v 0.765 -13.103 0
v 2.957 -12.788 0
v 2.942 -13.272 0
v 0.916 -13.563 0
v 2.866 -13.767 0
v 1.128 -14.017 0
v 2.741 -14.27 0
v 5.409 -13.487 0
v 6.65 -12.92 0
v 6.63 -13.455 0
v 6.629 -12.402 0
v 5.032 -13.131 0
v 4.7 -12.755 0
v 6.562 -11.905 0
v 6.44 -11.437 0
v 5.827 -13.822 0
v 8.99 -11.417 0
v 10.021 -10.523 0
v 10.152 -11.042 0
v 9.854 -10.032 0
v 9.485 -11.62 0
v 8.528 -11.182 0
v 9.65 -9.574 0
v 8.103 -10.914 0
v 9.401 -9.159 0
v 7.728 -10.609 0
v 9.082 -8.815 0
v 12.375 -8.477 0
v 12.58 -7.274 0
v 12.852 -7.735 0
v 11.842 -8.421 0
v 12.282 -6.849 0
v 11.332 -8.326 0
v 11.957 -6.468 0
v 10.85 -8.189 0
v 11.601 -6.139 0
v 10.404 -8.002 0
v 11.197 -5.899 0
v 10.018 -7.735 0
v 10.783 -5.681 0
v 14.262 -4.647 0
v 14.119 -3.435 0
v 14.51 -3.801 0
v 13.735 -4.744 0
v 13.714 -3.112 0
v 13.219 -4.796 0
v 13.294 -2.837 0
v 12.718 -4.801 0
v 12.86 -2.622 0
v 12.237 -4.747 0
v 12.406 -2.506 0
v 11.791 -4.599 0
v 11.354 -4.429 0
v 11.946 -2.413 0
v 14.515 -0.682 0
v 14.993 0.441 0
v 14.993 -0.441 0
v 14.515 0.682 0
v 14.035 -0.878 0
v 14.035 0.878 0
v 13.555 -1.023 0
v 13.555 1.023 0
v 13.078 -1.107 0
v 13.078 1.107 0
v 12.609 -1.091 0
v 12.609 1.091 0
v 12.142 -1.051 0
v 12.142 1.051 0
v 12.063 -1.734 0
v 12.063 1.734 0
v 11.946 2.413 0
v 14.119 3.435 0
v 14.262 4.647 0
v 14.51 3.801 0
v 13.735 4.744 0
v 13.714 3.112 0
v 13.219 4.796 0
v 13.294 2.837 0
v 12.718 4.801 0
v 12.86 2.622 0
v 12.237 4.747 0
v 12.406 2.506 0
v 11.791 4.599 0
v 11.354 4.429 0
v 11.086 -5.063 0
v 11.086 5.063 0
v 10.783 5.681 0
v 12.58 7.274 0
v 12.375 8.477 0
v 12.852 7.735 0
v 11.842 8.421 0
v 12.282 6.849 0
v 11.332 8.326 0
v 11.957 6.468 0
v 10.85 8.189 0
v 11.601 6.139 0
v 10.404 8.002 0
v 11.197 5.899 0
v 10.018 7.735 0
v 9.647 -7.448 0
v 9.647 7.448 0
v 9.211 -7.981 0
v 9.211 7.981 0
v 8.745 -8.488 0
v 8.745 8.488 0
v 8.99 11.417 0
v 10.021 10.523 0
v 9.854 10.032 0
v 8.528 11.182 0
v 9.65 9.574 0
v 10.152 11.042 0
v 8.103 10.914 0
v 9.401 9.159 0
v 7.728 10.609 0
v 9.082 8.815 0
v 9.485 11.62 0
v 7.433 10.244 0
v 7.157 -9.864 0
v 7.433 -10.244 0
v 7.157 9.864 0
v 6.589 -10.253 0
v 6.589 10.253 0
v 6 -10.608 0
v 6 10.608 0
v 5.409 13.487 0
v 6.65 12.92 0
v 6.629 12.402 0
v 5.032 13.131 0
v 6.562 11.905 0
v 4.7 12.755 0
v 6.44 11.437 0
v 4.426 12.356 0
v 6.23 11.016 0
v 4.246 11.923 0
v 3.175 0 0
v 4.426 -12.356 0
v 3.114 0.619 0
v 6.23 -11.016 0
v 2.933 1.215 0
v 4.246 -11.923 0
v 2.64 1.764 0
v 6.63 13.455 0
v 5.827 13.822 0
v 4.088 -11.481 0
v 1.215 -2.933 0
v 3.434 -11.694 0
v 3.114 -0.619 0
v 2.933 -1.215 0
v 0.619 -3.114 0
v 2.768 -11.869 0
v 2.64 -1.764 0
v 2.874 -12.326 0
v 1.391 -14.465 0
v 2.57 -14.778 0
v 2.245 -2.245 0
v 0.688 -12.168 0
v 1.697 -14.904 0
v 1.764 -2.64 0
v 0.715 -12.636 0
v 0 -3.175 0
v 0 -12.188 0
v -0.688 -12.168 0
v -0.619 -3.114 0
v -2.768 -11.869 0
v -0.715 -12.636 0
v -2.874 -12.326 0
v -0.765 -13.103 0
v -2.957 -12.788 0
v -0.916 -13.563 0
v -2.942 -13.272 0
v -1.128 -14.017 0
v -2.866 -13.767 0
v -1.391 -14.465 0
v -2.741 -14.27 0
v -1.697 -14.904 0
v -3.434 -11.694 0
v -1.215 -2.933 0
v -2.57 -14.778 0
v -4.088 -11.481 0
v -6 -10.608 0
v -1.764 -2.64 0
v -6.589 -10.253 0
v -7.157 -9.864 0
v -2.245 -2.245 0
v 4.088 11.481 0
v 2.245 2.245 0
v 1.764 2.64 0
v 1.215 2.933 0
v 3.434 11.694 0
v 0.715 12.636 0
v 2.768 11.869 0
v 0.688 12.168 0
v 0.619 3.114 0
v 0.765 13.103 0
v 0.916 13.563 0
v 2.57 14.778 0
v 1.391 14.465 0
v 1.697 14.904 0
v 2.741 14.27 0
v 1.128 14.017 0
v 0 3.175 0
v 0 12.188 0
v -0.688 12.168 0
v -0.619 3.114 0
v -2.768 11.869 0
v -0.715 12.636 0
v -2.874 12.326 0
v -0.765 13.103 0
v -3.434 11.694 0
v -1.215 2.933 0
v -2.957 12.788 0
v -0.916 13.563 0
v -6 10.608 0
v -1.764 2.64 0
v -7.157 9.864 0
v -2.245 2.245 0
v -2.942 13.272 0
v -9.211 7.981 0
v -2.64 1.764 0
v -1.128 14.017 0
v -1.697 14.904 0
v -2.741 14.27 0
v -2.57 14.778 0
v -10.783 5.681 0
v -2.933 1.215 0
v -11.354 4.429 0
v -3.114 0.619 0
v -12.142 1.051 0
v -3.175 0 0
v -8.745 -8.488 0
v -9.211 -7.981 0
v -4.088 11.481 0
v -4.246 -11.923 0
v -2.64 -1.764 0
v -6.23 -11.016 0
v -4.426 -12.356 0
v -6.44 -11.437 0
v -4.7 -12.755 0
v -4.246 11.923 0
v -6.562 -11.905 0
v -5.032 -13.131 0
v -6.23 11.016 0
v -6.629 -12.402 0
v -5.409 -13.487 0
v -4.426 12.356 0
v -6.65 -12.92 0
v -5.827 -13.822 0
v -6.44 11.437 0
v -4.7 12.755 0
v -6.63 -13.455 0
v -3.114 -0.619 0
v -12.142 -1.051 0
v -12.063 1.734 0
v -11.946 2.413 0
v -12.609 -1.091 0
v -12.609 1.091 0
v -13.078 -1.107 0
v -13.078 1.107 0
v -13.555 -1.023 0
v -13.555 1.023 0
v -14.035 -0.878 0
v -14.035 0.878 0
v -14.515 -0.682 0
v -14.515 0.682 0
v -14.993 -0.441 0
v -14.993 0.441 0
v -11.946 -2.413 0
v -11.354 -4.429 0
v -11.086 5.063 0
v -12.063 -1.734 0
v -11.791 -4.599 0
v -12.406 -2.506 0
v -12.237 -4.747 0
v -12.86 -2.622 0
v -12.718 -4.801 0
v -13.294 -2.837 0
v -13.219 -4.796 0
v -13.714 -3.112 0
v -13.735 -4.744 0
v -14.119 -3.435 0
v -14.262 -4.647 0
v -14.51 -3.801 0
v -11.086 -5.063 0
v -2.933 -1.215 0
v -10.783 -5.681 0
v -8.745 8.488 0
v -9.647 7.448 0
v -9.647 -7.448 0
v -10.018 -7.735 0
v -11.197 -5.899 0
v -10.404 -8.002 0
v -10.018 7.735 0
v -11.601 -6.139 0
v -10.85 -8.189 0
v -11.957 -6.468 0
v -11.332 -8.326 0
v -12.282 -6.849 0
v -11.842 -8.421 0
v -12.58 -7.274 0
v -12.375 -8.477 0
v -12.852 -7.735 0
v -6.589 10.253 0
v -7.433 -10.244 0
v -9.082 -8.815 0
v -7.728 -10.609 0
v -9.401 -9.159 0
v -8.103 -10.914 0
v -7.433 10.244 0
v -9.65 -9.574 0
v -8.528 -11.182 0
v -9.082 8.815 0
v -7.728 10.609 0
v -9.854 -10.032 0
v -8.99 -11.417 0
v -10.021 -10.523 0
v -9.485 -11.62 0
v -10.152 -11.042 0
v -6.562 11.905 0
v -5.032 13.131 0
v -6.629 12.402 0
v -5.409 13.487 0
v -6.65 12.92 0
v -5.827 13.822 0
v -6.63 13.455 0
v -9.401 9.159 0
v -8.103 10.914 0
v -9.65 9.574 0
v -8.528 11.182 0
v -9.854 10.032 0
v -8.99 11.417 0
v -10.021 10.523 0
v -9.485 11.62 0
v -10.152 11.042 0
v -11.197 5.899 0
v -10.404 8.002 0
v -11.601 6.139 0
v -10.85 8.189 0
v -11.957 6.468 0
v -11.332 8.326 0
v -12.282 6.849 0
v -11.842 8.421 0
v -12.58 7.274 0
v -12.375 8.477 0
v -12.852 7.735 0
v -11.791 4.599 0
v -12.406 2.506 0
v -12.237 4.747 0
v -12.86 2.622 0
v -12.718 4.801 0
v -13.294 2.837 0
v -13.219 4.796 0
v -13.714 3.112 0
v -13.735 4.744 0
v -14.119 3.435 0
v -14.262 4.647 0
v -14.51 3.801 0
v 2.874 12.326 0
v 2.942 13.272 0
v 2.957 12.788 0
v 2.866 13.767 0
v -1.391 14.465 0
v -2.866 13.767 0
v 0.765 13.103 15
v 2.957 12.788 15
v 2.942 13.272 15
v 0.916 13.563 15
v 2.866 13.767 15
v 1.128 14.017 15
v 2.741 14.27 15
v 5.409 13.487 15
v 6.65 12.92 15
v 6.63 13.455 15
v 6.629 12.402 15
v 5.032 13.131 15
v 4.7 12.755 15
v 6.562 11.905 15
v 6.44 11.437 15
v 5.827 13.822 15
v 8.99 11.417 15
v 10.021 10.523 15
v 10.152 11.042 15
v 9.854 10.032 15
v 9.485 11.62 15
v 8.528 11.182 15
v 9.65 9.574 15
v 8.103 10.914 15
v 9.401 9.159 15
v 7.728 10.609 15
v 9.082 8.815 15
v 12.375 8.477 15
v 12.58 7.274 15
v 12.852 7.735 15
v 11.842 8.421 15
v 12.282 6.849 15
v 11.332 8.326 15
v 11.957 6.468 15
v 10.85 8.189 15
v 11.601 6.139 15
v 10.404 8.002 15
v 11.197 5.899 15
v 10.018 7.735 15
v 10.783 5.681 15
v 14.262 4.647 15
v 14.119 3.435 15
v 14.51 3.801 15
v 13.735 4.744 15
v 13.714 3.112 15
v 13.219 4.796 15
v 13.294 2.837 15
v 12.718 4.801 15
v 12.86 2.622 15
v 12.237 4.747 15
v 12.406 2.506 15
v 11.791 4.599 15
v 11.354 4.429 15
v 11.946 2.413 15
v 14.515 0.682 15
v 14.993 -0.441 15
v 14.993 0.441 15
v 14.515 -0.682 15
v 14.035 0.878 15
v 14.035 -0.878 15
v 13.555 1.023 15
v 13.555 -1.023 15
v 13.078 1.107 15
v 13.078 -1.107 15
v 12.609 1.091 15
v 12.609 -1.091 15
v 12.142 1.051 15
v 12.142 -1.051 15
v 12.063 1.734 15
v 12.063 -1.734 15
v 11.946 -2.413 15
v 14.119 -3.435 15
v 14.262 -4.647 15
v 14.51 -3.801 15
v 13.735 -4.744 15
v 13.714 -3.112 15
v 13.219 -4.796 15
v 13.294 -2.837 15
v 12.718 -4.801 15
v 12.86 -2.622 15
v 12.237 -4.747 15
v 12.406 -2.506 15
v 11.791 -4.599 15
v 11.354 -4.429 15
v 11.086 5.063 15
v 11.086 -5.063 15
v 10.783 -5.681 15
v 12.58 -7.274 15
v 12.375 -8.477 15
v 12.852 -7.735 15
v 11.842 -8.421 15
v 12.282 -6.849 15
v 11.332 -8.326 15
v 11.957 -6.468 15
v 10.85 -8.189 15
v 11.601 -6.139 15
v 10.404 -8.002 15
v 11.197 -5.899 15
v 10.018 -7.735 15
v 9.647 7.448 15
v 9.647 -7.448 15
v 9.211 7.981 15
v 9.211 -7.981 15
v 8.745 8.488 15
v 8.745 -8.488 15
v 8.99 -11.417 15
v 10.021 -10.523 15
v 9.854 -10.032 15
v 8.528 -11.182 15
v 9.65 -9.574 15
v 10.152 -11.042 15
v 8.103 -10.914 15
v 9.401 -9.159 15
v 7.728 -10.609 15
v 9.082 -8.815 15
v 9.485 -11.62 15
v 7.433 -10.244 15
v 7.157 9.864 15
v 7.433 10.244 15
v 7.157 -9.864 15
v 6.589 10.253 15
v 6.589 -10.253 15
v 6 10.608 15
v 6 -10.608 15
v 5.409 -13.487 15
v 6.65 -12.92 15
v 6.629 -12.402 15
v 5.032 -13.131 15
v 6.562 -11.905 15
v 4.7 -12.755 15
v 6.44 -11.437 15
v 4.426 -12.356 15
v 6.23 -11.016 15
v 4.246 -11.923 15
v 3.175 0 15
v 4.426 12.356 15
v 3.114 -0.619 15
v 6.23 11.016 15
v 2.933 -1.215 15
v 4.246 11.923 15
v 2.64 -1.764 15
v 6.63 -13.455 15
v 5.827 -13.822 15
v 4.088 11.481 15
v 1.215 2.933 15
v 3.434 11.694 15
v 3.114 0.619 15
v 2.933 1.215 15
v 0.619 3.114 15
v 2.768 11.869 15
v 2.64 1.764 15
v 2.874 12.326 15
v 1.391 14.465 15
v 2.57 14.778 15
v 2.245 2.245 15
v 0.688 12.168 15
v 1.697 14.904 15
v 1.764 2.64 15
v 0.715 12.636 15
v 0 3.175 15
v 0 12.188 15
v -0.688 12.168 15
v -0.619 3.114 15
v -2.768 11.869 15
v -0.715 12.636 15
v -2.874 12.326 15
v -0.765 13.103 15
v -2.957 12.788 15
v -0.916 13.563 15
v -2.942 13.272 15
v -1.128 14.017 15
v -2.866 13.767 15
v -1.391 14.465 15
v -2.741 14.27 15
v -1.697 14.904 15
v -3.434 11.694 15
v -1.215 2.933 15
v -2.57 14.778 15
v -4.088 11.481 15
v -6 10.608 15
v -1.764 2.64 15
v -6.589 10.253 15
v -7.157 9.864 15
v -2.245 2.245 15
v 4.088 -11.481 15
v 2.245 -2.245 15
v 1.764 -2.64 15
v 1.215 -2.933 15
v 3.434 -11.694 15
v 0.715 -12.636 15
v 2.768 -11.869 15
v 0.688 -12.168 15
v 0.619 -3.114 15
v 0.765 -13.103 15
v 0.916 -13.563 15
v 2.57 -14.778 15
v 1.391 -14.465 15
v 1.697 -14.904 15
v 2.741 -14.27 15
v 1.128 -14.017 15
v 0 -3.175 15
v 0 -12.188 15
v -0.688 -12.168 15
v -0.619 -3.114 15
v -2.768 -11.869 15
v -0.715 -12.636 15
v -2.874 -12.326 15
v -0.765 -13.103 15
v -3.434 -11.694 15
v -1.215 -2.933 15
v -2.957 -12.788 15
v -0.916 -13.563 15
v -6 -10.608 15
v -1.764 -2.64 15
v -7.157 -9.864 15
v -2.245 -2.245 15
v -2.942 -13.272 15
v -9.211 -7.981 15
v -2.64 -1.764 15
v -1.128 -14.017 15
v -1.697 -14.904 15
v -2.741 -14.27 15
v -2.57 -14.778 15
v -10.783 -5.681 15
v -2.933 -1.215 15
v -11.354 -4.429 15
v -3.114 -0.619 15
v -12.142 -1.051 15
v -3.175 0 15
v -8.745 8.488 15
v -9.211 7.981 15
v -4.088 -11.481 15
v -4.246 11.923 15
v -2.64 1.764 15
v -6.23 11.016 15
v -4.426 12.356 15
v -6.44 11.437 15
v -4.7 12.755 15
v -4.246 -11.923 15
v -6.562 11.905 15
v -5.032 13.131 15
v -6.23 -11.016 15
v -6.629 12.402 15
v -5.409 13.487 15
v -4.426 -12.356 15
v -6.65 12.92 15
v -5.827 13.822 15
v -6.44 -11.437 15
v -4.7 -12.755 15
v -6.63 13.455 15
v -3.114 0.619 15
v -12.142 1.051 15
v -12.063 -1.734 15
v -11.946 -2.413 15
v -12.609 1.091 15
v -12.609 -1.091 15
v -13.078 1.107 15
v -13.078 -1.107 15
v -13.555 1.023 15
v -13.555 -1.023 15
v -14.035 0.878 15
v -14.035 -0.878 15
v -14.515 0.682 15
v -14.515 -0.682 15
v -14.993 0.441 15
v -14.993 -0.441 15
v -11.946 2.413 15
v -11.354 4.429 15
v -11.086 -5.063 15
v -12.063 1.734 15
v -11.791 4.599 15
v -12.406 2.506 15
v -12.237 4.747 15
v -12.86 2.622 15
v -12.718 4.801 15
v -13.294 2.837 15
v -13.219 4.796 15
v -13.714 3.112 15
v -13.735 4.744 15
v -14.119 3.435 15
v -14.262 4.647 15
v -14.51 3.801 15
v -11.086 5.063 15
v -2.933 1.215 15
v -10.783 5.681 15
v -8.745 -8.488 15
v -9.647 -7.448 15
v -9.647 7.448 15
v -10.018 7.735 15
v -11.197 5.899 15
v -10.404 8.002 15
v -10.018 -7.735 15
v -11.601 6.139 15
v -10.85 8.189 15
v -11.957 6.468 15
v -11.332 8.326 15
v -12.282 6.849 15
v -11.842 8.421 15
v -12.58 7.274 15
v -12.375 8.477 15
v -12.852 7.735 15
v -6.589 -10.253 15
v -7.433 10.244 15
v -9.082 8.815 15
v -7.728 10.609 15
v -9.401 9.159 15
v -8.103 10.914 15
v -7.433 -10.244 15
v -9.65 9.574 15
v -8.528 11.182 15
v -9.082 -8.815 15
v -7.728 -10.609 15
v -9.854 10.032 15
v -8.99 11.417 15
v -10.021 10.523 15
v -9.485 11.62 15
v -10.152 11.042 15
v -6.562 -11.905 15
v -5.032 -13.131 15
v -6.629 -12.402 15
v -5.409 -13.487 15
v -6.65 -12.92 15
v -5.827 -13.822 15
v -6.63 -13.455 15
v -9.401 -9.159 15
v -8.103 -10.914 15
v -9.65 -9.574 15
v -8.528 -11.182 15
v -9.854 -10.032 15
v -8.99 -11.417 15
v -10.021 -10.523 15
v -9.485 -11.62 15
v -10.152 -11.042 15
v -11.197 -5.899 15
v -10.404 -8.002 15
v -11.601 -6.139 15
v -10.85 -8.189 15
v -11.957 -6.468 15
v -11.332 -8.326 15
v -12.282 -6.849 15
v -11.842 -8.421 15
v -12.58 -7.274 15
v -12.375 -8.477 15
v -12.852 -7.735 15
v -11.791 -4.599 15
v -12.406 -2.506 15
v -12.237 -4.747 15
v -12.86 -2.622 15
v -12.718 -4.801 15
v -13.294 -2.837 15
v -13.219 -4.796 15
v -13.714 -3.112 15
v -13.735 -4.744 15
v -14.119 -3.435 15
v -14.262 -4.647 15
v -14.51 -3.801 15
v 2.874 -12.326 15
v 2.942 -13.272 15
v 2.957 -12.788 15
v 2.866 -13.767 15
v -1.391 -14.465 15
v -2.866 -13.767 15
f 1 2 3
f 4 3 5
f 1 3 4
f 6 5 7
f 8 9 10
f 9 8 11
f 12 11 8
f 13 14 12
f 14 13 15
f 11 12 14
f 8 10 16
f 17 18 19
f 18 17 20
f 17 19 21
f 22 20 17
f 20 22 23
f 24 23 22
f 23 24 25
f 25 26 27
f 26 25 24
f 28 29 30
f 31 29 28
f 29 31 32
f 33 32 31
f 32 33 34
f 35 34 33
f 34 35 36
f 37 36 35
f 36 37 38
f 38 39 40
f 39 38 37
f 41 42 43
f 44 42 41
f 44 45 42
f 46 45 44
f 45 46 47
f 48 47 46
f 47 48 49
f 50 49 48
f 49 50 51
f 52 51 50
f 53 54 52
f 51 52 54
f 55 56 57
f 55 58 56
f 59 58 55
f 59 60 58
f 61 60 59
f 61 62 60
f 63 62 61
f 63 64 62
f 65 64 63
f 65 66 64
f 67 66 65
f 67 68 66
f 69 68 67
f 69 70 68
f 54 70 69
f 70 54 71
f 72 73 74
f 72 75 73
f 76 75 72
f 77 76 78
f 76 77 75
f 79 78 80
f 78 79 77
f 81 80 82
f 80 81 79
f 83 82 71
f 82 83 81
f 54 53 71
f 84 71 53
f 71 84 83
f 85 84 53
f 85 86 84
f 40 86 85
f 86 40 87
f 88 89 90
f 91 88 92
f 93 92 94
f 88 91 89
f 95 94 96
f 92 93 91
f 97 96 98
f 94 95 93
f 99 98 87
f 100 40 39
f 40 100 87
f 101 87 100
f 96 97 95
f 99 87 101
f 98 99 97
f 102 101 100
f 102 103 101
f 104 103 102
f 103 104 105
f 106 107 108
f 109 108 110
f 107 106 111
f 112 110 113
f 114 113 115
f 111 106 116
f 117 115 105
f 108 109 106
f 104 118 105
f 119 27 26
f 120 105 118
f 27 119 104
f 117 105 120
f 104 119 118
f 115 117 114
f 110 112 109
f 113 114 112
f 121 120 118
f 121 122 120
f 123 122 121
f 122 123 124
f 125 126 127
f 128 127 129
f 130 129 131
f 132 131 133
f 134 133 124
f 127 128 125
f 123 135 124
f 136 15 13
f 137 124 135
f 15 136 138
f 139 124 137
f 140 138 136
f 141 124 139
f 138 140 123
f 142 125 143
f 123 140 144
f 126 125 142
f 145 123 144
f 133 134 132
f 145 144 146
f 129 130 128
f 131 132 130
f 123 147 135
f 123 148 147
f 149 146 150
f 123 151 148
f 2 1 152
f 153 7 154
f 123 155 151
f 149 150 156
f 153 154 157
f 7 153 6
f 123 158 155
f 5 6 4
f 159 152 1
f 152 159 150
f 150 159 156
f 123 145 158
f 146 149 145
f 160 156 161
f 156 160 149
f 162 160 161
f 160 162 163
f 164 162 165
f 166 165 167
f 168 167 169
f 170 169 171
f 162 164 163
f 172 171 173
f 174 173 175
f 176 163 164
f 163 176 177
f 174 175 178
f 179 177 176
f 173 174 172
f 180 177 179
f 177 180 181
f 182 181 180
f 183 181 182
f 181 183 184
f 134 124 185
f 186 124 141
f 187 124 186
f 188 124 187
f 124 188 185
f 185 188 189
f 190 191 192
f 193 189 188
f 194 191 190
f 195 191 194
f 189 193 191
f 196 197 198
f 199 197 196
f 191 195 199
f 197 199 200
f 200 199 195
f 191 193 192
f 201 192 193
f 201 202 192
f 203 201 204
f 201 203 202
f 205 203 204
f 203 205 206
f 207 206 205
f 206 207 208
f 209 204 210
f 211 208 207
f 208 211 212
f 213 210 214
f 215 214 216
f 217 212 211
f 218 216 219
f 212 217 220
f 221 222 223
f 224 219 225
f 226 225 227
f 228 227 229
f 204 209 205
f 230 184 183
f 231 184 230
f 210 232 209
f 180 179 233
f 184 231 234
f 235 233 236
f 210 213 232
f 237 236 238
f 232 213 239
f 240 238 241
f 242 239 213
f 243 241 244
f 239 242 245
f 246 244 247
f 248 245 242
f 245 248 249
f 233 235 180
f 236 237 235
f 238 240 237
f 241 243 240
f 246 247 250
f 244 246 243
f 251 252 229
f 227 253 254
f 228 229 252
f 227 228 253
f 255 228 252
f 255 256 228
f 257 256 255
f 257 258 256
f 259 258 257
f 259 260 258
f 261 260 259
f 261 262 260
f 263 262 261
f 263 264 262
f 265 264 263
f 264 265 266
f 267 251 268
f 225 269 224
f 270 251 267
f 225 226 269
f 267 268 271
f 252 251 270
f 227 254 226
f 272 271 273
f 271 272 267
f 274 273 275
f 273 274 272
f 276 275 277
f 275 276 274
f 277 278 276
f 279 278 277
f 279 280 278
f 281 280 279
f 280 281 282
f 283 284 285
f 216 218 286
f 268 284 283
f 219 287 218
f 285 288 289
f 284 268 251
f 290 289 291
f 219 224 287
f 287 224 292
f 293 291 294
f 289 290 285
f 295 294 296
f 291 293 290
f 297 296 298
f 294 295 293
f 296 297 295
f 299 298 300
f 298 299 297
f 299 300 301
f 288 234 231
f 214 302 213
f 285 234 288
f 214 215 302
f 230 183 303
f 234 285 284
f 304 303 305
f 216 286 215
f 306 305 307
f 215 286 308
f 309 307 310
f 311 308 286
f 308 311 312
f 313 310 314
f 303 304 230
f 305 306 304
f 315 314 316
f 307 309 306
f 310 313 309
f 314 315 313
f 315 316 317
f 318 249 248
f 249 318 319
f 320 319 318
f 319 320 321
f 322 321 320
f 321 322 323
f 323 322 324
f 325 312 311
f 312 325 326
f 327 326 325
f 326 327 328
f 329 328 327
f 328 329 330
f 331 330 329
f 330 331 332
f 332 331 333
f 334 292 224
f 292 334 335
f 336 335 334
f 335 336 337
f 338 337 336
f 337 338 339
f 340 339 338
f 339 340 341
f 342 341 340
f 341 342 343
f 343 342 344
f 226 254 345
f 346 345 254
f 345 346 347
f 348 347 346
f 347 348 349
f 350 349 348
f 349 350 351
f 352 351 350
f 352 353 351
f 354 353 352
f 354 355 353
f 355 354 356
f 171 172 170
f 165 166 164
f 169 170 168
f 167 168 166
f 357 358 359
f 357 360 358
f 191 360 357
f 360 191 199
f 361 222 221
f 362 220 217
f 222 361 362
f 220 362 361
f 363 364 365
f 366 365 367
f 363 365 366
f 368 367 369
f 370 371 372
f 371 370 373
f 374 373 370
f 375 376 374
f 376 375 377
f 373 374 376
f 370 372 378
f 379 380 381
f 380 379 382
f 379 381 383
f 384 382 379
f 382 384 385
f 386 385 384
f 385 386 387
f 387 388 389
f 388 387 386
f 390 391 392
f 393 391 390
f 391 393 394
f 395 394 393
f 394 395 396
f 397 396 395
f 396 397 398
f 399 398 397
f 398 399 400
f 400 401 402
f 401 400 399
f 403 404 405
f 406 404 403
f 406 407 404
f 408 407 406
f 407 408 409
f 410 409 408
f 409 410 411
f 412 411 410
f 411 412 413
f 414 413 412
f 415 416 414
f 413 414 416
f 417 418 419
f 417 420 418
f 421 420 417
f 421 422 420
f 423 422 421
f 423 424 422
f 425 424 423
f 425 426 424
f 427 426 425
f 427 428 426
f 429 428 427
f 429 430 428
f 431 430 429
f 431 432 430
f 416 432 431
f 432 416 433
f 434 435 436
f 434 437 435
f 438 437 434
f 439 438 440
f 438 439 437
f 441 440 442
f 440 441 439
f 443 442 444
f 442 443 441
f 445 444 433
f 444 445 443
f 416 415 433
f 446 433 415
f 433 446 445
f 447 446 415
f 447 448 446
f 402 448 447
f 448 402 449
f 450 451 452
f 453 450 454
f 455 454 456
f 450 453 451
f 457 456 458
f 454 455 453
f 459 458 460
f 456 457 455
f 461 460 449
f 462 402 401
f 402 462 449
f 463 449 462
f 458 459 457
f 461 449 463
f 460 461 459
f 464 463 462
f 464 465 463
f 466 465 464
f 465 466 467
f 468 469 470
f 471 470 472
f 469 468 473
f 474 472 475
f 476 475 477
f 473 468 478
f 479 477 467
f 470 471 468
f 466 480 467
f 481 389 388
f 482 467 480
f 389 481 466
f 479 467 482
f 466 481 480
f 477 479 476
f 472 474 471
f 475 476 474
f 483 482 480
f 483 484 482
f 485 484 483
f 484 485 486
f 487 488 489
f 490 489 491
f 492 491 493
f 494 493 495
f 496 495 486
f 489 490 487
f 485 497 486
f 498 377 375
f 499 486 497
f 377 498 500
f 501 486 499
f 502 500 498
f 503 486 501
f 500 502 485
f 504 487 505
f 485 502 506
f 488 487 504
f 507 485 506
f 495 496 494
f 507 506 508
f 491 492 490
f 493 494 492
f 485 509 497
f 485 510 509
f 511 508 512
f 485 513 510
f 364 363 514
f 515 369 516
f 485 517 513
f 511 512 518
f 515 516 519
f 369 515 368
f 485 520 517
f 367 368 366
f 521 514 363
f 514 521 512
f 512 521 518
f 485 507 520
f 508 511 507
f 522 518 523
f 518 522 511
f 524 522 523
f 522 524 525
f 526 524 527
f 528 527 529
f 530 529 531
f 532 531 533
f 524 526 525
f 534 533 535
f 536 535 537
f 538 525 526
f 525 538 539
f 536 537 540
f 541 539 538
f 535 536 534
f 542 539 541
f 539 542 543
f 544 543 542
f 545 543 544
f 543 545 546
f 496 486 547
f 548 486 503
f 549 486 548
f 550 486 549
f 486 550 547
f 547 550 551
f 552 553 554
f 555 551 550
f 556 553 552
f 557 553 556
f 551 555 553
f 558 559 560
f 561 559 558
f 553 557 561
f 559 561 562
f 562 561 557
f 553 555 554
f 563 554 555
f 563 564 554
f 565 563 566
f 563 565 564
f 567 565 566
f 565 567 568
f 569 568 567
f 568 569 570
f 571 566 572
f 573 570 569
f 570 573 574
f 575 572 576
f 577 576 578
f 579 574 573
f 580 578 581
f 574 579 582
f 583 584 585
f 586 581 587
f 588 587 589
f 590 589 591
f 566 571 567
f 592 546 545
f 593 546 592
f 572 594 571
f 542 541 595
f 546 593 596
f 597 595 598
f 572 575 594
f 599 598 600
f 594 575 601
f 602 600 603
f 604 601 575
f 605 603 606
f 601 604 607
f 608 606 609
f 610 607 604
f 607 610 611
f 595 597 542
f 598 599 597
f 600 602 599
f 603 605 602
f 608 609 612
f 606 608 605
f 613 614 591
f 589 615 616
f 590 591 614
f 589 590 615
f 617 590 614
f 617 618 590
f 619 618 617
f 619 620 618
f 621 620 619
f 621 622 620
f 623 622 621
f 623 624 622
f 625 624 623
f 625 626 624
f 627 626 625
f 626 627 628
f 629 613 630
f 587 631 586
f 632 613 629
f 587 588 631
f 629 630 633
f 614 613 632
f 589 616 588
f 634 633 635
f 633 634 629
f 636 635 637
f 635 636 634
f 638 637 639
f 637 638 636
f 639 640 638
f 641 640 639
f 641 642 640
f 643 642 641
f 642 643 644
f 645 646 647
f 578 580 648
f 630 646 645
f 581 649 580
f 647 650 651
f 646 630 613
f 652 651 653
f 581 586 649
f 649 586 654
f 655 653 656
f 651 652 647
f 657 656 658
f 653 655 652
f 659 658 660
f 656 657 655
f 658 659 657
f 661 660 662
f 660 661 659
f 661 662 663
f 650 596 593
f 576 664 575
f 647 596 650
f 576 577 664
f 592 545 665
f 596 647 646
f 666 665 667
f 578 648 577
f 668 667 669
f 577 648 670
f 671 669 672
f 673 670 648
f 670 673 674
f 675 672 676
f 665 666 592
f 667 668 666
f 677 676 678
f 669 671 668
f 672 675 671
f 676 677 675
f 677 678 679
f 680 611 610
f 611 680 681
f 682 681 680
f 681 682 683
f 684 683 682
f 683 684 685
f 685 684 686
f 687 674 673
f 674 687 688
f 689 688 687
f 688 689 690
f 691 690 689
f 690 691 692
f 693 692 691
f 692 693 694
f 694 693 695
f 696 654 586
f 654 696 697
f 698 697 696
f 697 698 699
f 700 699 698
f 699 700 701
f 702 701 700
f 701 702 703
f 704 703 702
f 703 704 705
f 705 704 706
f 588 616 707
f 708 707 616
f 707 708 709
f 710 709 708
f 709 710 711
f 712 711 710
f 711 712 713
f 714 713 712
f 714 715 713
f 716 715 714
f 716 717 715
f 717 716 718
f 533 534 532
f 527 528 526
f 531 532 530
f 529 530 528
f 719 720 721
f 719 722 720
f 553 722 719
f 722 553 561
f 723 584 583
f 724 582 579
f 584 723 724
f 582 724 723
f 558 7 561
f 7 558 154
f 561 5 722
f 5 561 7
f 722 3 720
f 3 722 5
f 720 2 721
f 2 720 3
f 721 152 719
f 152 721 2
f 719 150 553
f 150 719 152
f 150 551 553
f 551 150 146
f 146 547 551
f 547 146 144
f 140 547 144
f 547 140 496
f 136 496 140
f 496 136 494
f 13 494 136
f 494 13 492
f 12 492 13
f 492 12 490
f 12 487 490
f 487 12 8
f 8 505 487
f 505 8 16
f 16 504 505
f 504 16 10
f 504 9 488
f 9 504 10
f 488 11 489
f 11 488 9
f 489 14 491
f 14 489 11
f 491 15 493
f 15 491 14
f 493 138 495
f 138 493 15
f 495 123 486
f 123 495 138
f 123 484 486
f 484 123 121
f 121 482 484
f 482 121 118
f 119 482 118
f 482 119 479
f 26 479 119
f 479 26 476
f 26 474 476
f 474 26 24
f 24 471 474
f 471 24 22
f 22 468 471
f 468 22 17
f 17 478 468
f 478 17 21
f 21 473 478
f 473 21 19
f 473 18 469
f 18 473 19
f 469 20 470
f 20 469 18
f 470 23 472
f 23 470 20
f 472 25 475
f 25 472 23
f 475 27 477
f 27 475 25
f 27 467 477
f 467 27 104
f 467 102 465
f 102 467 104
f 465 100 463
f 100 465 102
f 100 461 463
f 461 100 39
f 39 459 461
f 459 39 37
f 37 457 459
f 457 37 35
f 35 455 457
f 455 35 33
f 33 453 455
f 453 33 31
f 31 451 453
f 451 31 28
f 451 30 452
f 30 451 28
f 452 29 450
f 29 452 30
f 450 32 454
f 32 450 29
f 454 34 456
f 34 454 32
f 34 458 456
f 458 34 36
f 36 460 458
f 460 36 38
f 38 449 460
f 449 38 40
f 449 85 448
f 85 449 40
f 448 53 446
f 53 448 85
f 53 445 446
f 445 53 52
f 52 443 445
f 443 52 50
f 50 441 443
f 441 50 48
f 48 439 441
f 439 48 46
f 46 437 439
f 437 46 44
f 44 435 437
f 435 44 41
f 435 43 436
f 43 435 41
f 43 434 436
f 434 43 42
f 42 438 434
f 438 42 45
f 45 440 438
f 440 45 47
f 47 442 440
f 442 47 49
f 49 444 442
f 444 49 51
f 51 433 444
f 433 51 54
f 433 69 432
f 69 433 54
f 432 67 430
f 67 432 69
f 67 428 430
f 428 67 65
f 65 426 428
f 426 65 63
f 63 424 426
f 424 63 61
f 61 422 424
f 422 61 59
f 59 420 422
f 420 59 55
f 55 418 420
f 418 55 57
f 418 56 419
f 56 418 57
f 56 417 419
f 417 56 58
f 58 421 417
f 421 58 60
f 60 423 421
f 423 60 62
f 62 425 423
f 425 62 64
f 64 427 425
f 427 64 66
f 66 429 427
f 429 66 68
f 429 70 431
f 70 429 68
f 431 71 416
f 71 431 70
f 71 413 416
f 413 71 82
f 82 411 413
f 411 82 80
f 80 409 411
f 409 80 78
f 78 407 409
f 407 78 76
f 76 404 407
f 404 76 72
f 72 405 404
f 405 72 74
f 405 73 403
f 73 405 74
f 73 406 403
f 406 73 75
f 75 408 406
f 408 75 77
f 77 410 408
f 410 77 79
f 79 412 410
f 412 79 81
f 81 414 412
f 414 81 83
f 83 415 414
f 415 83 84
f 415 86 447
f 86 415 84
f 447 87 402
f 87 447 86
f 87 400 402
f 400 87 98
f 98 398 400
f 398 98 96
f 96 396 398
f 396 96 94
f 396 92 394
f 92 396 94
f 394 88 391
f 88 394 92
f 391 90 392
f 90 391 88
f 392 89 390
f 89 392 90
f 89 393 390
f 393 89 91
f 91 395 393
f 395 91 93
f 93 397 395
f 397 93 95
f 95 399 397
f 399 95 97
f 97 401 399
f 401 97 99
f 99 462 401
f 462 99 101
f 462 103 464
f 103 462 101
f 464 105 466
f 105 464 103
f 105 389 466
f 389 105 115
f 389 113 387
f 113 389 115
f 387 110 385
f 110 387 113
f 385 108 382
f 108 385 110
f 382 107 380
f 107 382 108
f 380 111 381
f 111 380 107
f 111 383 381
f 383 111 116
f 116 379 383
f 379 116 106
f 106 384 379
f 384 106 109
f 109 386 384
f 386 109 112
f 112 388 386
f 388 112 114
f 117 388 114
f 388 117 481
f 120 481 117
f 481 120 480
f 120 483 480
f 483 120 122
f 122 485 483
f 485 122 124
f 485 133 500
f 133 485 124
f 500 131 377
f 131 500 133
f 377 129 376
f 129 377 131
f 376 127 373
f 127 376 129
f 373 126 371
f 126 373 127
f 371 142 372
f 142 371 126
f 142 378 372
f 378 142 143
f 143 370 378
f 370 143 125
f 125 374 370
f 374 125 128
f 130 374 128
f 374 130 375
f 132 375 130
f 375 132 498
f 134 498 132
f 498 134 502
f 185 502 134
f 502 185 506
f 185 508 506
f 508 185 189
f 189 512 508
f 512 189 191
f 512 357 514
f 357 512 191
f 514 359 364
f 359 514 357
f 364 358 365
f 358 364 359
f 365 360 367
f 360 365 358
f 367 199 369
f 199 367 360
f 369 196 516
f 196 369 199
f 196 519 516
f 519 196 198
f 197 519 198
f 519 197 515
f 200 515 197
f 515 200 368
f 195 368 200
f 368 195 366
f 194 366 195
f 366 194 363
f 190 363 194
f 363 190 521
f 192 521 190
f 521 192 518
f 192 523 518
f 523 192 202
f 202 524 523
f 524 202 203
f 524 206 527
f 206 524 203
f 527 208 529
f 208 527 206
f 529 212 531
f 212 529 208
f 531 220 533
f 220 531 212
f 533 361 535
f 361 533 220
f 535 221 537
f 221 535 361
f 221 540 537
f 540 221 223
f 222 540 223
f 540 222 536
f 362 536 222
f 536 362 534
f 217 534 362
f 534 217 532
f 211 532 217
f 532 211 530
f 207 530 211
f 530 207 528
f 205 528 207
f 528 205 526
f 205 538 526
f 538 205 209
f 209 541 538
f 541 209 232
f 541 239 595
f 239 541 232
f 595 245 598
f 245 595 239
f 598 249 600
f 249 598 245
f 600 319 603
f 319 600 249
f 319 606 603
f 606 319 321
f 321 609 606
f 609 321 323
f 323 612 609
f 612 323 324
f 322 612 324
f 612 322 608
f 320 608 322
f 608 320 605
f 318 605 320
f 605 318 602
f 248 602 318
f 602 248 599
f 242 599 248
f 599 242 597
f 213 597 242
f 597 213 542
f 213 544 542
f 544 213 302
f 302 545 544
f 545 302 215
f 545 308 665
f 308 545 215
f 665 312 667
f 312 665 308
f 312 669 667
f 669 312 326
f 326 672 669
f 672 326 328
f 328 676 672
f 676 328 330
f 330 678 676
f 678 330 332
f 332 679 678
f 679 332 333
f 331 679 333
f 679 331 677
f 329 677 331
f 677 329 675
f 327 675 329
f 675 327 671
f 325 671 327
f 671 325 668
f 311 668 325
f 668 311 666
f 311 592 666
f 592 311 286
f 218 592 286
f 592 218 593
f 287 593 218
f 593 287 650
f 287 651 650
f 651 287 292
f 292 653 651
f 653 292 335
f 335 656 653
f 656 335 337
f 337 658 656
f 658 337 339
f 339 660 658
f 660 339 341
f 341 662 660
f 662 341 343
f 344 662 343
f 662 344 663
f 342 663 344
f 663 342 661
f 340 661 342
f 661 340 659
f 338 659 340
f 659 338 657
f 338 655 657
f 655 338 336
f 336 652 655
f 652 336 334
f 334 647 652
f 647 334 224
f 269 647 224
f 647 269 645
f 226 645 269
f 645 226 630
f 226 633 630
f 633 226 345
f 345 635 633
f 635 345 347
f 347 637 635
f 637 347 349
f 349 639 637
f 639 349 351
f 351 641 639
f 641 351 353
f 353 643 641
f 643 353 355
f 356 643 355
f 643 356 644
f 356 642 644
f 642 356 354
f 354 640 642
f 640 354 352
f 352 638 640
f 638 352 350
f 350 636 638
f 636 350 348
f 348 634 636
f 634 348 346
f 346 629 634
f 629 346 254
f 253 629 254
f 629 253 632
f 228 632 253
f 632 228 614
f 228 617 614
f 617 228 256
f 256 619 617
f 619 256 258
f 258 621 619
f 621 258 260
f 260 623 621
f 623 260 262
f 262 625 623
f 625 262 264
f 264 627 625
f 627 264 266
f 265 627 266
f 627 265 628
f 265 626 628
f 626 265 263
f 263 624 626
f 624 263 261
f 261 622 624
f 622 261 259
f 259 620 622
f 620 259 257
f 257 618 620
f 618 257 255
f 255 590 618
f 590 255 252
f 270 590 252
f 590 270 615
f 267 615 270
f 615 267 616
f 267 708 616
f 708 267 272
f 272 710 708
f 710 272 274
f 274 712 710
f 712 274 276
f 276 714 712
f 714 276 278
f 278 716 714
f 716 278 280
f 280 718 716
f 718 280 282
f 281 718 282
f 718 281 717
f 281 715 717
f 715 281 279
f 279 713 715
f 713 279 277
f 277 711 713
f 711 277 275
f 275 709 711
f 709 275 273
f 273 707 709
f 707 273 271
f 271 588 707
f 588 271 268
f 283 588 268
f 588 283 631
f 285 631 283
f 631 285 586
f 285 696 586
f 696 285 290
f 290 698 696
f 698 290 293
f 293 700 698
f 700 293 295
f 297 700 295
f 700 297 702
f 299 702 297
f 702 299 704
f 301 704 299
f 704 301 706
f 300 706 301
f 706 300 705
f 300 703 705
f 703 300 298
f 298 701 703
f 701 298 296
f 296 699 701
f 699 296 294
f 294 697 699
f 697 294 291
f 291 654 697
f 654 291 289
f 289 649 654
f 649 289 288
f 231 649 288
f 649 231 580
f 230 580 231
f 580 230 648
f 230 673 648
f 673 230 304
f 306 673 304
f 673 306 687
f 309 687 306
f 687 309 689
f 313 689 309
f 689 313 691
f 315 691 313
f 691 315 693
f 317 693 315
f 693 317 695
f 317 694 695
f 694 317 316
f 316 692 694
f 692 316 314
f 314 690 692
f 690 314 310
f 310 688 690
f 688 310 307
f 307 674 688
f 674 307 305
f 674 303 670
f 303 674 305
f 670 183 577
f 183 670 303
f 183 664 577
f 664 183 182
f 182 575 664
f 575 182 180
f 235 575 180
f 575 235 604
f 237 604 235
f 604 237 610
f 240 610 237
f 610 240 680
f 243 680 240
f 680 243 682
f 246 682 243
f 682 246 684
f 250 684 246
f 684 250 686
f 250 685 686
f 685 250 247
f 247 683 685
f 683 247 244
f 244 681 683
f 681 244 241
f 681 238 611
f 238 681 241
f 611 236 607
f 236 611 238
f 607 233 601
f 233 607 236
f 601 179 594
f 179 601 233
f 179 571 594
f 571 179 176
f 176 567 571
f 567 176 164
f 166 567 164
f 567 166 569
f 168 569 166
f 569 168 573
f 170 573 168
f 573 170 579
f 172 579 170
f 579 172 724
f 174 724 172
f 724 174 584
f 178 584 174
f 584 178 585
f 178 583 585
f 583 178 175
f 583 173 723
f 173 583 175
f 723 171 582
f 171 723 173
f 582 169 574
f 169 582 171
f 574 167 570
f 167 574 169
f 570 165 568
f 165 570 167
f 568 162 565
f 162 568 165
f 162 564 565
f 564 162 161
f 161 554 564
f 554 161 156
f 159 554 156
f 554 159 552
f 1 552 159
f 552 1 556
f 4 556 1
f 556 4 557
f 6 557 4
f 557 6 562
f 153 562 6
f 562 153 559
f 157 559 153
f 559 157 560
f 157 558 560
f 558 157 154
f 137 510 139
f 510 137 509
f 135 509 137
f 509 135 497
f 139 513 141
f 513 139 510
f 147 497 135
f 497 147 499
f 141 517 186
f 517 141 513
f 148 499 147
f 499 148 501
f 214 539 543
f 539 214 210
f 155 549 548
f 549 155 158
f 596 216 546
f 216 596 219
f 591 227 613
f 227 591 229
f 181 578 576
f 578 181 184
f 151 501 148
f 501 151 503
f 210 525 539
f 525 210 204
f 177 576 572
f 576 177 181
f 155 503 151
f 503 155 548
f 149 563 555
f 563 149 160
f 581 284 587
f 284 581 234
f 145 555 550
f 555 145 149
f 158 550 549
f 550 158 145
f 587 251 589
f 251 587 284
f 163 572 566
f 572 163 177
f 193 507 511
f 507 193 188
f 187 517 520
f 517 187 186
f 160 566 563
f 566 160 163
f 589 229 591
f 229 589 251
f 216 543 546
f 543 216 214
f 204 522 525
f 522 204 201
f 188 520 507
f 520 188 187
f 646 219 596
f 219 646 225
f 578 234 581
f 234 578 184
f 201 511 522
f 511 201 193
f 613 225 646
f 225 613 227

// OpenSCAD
$fn = 32;

// ----------------------------------------------------------------------
// Spur gear: m=1.25 z=22, 30 mm tip diameter x 15 mm
// ----------------------------------------------------------------------

// --- parameters (mm) ---
modul = 1.25;             // module
n_teeth = 22;             // number of teeth
width = 15;               // face width
pa = 20;                  // pressure angle, deg
shaft_d = 6.35;           // shaft bore

/* --- involute profile --- */
pitch_r = modul * n_teeth / 2;
base_r = pitch_r * cos(pa);
tip_r = pitch_r + modul;
root_r = pitch_r - 1.25 * modul;
flank_steps = 6;

function inv_deg(a) = (tan(a) - a * PI / 180) * 180 / PI;
function flank_r(i) = root_r + (tip_r - root_r) * i / flank_steps;
function half_angle(r) = 90 / n_teeth + inv_deg(pa) - inv_deg(acos(min(1, base_r / r)));
function tooth_pt(k, i, side) =
    let (r = flank_r(i), a = k * 360 / n_teeth + side * half_angle(r))
    [r * cos(a), r * sin(a)];

module tooth_profile() {
  polygon(points = [
    for (k = [0 : n_teeth - 1])
      each [
        for (i = [0 : flank_steps]) tooth_pt(k, i, -1),
        for (i = [flank_steps : -1 : 0]) tooth_pt(k, i, 1),
        let (ta = (k + 0.5) * 360 / n_teeth)
          [root_r * cos(ta), root_r * sin(ta)]
      ]
  ]);
}

module gear_disc() {
  linear_extrude(height = width) tooth_profile();
}

difference() {
  gear_disc();
  translate([0, 0, -1]) cylinder(h = width + 3, d = shaft_d);
}
